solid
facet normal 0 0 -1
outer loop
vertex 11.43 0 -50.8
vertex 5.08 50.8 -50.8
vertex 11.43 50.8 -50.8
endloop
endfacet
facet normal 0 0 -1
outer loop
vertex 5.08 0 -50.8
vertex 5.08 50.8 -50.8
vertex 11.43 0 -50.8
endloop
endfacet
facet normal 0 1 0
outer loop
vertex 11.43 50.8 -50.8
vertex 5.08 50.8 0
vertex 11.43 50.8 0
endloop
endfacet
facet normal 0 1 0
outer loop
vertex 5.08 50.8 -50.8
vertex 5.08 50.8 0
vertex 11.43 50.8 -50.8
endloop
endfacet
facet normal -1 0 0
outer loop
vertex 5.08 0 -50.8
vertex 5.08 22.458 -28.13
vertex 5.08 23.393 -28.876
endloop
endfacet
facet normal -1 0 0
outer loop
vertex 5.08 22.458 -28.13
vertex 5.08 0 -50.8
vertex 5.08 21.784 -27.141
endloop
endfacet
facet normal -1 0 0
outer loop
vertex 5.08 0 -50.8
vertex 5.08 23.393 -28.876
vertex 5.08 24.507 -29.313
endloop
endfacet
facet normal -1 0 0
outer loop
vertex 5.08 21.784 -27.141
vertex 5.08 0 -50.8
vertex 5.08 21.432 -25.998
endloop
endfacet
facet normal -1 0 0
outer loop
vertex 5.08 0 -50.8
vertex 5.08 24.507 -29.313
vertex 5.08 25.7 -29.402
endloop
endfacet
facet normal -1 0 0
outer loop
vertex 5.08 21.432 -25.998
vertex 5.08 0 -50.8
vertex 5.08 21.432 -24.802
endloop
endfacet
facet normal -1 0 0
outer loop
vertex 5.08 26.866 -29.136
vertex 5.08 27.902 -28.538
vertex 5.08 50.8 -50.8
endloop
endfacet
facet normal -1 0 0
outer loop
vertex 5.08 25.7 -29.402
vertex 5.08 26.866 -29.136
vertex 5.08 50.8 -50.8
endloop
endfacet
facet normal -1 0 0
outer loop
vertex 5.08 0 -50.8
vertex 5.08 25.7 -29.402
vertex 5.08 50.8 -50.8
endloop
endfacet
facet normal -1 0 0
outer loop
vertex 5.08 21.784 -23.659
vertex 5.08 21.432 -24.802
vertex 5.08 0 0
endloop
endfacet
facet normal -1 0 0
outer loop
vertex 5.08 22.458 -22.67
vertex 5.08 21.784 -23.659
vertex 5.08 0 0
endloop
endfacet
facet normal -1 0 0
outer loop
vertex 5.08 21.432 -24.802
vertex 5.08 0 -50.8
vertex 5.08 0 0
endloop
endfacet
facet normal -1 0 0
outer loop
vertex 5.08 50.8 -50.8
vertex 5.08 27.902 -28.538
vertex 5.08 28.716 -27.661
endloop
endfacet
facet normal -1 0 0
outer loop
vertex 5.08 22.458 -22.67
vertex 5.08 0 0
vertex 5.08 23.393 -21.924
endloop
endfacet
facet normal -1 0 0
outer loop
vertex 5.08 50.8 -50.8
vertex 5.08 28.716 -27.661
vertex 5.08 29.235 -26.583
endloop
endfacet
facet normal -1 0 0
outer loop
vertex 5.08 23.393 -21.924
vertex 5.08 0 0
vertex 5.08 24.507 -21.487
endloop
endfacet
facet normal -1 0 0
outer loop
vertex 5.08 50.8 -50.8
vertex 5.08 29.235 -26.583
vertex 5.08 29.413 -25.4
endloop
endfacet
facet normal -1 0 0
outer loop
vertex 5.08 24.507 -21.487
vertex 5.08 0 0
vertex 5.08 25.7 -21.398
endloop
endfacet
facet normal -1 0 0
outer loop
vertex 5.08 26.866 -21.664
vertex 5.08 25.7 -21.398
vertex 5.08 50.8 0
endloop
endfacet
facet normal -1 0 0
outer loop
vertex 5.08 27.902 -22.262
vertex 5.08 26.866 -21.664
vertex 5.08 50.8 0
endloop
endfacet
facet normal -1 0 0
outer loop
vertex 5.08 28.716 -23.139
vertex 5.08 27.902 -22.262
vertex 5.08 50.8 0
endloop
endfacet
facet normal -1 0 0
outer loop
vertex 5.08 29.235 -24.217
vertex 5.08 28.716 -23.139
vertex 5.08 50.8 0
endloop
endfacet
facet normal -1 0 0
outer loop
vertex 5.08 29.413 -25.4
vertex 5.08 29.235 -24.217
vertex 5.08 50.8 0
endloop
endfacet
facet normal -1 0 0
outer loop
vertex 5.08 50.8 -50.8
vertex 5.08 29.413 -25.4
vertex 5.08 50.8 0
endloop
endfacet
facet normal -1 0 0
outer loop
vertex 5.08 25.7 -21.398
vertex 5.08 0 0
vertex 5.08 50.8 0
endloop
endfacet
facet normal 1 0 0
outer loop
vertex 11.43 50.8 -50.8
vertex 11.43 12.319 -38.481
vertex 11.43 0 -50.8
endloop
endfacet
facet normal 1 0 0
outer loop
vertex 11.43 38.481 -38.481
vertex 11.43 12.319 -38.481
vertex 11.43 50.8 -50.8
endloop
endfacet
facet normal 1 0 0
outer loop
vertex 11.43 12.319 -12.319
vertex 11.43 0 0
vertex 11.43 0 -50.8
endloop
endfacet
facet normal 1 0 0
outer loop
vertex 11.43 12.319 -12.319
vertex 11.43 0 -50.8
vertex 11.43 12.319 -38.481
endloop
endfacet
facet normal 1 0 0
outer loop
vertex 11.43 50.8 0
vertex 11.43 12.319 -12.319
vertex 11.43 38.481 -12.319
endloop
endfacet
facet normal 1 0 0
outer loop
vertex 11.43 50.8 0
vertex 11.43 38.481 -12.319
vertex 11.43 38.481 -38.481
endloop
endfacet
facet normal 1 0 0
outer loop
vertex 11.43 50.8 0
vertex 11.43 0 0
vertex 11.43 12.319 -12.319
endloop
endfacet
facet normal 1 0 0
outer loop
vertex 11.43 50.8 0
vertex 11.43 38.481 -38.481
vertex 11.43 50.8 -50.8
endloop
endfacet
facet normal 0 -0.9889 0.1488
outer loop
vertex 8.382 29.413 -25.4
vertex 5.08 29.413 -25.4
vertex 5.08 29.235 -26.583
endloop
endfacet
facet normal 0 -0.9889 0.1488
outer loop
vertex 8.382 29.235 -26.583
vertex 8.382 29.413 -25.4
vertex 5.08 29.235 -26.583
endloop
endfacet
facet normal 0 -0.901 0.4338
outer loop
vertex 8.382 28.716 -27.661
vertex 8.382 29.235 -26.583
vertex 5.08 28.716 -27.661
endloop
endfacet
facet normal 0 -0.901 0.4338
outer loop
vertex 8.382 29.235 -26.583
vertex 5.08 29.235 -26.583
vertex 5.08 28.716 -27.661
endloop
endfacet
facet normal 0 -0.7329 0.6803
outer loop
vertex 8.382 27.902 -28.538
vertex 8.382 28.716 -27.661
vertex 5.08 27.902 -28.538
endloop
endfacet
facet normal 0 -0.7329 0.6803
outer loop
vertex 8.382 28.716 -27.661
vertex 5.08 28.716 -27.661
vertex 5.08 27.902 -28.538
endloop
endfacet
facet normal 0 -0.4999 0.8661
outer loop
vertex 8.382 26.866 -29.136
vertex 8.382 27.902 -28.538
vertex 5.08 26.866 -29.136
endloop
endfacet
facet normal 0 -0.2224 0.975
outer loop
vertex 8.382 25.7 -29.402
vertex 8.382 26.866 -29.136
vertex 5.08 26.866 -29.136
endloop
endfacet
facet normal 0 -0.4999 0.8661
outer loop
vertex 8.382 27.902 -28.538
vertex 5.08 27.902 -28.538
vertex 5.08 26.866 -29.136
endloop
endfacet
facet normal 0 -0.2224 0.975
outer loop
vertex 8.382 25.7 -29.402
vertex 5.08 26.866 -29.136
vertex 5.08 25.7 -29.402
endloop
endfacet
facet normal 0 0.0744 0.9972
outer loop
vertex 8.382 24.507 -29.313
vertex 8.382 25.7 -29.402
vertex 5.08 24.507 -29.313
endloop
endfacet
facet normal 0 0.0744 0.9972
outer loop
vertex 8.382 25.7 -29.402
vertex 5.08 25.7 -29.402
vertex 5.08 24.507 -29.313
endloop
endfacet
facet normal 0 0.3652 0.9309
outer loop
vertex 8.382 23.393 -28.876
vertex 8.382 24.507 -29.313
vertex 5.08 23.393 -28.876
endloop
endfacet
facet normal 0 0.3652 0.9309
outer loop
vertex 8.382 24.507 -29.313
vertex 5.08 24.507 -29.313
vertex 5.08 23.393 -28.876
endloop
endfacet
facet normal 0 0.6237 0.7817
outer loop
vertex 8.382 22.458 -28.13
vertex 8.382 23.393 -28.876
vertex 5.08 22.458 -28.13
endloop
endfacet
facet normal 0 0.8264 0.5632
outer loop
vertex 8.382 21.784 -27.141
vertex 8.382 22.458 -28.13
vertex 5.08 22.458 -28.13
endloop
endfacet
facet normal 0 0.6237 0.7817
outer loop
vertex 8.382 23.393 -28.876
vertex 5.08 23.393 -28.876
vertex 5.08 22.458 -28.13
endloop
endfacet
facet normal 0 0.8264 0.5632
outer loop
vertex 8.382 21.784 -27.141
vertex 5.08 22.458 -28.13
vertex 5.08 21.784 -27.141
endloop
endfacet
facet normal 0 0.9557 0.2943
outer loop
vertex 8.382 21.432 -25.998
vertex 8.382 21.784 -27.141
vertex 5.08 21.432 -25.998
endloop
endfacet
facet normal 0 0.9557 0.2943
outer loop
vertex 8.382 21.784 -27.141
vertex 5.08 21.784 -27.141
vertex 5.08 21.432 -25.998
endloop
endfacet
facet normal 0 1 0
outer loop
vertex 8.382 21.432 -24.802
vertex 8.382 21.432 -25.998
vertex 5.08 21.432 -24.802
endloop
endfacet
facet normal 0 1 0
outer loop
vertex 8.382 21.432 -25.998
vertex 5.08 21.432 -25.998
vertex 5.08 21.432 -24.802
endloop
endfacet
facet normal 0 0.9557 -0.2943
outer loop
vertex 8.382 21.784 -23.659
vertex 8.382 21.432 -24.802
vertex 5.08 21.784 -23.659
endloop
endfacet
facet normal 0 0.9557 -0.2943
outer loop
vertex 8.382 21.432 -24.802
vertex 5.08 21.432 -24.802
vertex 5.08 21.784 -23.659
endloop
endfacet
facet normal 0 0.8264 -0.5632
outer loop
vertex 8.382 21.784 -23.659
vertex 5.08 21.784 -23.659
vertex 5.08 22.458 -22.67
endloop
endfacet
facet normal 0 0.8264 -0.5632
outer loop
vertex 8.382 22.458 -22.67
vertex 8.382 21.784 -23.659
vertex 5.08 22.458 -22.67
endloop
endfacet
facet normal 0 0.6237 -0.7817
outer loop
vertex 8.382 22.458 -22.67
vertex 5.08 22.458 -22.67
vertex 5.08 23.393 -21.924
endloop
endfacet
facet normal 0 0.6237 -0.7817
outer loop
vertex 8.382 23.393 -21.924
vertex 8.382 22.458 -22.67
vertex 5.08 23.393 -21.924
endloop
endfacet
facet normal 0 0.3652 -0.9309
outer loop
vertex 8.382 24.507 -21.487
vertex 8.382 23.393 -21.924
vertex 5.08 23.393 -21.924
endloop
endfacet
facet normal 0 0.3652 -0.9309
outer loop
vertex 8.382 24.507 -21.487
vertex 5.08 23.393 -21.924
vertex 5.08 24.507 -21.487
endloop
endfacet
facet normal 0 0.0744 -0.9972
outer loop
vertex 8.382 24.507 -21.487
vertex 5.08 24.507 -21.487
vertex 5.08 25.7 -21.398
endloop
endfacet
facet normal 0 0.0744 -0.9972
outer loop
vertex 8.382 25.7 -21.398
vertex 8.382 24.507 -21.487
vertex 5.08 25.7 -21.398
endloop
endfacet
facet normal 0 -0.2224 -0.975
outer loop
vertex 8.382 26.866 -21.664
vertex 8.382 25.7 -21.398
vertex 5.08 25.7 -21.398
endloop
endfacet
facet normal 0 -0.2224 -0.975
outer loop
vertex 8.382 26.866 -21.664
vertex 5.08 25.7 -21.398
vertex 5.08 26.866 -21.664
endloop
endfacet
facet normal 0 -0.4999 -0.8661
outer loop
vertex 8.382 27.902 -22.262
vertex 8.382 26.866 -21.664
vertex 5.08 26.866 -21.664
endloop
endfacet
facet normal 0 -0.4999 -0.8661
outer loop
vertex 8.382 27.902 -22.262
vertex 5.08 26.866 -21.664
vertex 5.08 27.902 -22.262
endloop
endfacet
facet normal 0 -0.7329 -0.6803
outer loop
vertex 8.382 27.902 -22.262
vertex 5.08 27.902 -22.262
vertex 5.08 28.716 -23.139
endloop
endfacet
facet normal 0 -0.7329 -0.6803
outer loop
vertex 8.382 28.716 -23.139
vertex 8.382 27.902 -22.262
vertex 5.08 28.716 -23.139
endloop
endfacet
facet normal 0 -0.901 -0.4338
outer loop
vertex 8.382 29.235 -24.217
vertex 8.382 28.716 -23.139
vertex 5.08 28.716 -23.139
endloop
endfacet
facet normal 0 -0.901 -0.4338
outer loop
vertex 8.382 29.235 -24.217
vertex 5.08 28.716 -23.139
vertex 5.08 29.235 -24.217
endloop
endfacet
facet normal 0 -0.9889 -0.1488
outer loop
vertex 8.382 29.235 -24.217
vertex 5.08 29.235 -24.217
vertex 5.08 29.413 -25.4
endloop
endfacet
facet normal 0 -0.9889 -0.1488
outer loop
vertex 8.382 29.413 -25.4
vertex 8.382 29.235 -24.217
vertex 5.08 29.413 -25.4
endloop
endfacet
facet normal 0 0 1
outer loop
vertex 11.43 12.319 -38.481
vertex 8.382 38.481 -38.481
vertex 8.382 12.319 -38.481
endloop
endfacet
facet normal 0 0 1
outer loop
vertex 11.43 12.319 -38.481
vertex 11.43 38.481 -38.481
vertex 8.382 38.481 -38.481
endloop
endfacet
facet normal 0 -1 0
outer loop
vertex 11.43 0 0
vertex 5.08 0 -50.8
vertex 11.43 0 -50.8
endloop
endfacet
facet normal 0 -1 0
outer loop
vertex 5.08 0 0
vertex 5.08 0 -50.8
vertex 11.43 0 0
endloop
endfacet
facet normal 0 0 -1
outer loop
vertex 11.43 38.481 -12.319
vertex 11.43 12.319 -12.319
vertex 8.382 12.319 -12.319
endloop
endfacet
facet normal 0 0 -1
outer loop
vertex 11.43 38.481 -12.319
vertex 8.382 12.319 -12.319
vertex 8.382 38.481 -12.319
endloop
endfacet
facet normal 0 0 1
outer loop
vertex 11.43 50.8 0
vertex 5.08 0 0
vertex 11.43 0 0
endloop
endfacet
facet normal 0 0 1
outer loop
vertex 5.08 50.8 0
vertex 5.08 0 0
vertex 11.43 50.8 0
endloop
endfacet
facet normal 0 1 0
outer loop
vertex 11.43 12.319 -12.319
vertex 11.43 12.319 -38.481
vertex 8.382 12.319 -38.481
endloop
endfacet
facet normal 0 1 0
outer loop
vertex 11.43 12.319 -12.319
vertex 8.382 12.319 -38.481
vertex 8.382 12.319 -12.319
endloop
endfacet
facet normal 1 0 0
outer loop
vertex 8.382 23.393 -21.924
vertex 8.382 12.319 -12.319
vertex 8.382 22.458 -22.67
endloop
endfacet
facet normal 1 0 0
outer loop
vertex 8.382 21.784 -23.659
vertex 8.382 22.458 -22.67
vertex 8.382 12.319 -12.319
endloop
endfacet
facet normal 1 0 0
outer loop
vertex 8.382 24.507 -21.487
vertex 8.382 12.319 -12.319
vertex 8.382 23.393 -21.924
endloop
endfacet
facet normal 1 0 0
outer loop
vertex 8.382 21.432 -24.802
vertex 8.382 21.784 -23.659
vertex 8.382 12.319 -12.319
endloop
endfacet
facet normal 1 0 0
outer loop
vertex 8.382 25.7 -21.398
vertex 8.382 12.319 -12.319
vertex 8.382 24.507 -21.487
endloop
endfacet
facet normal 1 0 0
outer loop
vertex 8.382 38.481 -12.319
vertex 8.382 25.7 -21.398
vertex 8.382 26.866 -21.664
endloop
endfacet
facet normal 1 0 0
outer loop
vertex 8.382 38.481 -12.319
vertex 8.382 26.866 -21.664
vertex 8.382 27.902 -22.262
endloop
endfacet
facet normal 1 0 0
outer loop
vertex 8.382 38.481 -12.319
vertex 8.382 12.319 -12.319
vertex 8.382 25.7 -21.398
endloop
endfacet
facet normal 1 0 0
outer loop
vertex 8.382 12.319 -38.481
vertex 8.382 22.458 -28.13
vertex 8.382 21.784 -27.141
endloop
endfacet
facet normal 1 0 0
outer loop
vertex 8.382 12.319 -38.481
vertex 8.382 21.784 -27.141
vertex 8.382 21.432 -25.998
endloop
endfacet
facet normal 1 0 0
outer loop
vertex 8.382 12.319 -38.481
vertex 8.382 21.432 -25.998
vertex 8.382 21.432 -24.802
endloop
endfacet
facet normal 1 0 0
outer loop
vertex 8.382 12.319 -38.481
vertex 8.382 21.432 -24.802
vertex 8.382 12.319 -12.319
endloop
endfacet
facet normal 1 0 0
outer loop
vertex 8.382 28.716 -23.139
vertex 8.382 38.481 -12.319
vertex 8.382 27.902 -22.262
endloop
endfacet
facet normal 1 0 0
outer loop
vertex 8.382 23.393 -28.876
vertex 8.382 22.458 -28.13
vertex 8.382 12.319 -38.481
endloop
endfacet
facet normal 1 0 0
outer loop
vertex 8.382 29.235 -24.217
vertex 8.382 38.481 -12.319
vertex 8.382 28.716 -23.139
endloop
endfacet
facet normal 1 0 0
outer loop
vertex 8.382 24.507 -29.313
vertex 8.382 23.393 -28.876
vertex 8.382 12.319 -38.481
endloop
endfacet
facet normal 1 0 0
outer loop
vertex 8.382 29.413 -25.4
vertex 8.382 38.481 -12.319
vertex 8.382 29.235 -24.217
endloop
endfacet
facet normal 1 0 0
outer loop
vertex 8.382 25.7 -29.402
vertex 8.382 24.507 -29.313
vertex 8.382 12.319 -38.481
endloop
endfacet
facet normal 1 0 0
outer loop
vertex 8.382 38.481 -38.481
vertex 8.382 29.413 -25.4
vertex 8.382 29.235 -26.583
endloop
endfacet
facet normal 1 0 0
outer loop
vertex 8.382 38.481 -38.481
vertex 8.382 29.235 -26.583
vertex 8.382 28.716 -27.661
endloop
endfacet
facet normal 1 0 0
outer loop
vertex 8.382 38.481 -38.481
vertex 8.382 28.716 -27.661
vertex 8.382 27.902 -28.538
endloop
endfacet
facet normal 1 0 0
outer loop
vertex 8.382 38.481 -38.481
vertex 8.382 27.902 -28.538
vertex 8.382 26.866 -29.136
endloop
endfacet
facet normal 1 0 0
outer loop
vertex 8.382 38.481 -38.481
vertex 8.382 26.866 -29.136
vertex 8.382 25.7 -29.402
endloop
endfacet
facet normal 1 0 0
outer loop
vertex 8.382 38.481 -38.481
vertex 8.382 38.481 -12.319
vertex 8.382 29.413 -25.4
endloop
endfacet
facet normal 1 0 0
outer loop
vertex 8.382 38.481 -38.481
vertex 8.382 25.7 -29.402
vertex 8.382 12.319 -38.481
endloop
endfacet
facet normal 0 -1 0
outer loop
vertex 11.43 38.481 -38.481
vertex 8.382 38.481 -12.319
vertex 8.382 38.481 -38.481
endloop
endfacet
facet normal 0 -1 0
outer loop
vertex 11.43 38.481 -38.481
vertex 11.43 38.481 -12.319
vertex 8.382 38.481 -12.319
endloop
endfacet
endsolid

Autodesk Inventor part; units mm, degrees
ref_plane "YZ Plane" through (0, 0, 0) normal (1, 0, 0) x (0, 1, 0)
ref_plane "XZ Plane" through (0, 0, 0) normal (0, 1, 0) x (-1, 0, 0)
ref_plane "XY Plane" through (0, 0, 0) normal (0, 0, 1) x (1, 0, 0)
sketch "Sketch1" plane through (0, 0, 0) normal (1, 0, 0) x (0, 1, 0)
  line L0 (0, 0) -> (50.8, 0)
  line L1 (50.8, 0) -> (50.8, -50.8)
  line L2 (50.8, -50.8) -> (0, -50.8)
  line L3 (0, -50.8) -> (0, 0)
  line L4 (50.8, 0) -> (50.8, -25.4)
  circle A0 centre (25.4, -25.4) radius 4.0132
  dimension "d0" = 50.8
  dimension "d1" = 50.8
  dimension "d5" = 8.0264
extrude "Extrusion1" add sketch "Sketch1" along normal blind 11.43
sketch "Sketch2" plane through (11.43, 0, 0) normal (1, 0, 0) x (0, 0, -1)
  line L0 (12.319, 38.481) -> (38.481, 38.481)
  line L1 (38.481, 38.481) -> (38.481, 12.319)
  line L2 (38.481, 12.319) -> (12.319, 12.319)
  line L3 (12.319, 12.319) -> (12.319, 38.481)
  line L4 (50.8, 50.8) -> (0, 50.8) projected
  line L5 (0, 0) -> (50.8, 0) projected
  line L6 (0, 50.8) -> (0, 0) projected
  dimension "d8" = 26.162
  dimension "d9" = 26.162
extrude "Extrusion2" cut sketch "Sketch2" against normal blind 3.048
sketch "Sketch3" plane through (0, 0, 0) normal (-1, 0, 0) x (0, 0, 1)
  circle A0 centre (-25.4, 25.4) radius 4.0132 projected
  circle A1 centre (-25.4, 25.4) radius 8.255
  point P0 (0, 0)
  dimension "d12" = 16.51
extrude "Extrusion3" cut sketch "Sketch3" against normal blind 1.905
sketch "Sketch4" plane through (0, 0, 0) normal (0, 0, 1) x (1, 0, 0)
  line L0 (0, 0) -> (11.43, 0) projected
  line L1 (0, 50.8) -> (11.43, 50.8) projected
  line L2 (0, 0) -> (5.08, 0)
  line L3 (5.08, 0) -> (5.08, 50.8)
  line L4 (5.08, 50.8) -> (0, 50.8)
  line L5 (0, 50.8) -> (0, 0)
  dimension "d15" = 5.08
extrude "Extrusion4" cut sketch "Sketch4" against normal blind 50.8
properties part number "220425 End Cap"
